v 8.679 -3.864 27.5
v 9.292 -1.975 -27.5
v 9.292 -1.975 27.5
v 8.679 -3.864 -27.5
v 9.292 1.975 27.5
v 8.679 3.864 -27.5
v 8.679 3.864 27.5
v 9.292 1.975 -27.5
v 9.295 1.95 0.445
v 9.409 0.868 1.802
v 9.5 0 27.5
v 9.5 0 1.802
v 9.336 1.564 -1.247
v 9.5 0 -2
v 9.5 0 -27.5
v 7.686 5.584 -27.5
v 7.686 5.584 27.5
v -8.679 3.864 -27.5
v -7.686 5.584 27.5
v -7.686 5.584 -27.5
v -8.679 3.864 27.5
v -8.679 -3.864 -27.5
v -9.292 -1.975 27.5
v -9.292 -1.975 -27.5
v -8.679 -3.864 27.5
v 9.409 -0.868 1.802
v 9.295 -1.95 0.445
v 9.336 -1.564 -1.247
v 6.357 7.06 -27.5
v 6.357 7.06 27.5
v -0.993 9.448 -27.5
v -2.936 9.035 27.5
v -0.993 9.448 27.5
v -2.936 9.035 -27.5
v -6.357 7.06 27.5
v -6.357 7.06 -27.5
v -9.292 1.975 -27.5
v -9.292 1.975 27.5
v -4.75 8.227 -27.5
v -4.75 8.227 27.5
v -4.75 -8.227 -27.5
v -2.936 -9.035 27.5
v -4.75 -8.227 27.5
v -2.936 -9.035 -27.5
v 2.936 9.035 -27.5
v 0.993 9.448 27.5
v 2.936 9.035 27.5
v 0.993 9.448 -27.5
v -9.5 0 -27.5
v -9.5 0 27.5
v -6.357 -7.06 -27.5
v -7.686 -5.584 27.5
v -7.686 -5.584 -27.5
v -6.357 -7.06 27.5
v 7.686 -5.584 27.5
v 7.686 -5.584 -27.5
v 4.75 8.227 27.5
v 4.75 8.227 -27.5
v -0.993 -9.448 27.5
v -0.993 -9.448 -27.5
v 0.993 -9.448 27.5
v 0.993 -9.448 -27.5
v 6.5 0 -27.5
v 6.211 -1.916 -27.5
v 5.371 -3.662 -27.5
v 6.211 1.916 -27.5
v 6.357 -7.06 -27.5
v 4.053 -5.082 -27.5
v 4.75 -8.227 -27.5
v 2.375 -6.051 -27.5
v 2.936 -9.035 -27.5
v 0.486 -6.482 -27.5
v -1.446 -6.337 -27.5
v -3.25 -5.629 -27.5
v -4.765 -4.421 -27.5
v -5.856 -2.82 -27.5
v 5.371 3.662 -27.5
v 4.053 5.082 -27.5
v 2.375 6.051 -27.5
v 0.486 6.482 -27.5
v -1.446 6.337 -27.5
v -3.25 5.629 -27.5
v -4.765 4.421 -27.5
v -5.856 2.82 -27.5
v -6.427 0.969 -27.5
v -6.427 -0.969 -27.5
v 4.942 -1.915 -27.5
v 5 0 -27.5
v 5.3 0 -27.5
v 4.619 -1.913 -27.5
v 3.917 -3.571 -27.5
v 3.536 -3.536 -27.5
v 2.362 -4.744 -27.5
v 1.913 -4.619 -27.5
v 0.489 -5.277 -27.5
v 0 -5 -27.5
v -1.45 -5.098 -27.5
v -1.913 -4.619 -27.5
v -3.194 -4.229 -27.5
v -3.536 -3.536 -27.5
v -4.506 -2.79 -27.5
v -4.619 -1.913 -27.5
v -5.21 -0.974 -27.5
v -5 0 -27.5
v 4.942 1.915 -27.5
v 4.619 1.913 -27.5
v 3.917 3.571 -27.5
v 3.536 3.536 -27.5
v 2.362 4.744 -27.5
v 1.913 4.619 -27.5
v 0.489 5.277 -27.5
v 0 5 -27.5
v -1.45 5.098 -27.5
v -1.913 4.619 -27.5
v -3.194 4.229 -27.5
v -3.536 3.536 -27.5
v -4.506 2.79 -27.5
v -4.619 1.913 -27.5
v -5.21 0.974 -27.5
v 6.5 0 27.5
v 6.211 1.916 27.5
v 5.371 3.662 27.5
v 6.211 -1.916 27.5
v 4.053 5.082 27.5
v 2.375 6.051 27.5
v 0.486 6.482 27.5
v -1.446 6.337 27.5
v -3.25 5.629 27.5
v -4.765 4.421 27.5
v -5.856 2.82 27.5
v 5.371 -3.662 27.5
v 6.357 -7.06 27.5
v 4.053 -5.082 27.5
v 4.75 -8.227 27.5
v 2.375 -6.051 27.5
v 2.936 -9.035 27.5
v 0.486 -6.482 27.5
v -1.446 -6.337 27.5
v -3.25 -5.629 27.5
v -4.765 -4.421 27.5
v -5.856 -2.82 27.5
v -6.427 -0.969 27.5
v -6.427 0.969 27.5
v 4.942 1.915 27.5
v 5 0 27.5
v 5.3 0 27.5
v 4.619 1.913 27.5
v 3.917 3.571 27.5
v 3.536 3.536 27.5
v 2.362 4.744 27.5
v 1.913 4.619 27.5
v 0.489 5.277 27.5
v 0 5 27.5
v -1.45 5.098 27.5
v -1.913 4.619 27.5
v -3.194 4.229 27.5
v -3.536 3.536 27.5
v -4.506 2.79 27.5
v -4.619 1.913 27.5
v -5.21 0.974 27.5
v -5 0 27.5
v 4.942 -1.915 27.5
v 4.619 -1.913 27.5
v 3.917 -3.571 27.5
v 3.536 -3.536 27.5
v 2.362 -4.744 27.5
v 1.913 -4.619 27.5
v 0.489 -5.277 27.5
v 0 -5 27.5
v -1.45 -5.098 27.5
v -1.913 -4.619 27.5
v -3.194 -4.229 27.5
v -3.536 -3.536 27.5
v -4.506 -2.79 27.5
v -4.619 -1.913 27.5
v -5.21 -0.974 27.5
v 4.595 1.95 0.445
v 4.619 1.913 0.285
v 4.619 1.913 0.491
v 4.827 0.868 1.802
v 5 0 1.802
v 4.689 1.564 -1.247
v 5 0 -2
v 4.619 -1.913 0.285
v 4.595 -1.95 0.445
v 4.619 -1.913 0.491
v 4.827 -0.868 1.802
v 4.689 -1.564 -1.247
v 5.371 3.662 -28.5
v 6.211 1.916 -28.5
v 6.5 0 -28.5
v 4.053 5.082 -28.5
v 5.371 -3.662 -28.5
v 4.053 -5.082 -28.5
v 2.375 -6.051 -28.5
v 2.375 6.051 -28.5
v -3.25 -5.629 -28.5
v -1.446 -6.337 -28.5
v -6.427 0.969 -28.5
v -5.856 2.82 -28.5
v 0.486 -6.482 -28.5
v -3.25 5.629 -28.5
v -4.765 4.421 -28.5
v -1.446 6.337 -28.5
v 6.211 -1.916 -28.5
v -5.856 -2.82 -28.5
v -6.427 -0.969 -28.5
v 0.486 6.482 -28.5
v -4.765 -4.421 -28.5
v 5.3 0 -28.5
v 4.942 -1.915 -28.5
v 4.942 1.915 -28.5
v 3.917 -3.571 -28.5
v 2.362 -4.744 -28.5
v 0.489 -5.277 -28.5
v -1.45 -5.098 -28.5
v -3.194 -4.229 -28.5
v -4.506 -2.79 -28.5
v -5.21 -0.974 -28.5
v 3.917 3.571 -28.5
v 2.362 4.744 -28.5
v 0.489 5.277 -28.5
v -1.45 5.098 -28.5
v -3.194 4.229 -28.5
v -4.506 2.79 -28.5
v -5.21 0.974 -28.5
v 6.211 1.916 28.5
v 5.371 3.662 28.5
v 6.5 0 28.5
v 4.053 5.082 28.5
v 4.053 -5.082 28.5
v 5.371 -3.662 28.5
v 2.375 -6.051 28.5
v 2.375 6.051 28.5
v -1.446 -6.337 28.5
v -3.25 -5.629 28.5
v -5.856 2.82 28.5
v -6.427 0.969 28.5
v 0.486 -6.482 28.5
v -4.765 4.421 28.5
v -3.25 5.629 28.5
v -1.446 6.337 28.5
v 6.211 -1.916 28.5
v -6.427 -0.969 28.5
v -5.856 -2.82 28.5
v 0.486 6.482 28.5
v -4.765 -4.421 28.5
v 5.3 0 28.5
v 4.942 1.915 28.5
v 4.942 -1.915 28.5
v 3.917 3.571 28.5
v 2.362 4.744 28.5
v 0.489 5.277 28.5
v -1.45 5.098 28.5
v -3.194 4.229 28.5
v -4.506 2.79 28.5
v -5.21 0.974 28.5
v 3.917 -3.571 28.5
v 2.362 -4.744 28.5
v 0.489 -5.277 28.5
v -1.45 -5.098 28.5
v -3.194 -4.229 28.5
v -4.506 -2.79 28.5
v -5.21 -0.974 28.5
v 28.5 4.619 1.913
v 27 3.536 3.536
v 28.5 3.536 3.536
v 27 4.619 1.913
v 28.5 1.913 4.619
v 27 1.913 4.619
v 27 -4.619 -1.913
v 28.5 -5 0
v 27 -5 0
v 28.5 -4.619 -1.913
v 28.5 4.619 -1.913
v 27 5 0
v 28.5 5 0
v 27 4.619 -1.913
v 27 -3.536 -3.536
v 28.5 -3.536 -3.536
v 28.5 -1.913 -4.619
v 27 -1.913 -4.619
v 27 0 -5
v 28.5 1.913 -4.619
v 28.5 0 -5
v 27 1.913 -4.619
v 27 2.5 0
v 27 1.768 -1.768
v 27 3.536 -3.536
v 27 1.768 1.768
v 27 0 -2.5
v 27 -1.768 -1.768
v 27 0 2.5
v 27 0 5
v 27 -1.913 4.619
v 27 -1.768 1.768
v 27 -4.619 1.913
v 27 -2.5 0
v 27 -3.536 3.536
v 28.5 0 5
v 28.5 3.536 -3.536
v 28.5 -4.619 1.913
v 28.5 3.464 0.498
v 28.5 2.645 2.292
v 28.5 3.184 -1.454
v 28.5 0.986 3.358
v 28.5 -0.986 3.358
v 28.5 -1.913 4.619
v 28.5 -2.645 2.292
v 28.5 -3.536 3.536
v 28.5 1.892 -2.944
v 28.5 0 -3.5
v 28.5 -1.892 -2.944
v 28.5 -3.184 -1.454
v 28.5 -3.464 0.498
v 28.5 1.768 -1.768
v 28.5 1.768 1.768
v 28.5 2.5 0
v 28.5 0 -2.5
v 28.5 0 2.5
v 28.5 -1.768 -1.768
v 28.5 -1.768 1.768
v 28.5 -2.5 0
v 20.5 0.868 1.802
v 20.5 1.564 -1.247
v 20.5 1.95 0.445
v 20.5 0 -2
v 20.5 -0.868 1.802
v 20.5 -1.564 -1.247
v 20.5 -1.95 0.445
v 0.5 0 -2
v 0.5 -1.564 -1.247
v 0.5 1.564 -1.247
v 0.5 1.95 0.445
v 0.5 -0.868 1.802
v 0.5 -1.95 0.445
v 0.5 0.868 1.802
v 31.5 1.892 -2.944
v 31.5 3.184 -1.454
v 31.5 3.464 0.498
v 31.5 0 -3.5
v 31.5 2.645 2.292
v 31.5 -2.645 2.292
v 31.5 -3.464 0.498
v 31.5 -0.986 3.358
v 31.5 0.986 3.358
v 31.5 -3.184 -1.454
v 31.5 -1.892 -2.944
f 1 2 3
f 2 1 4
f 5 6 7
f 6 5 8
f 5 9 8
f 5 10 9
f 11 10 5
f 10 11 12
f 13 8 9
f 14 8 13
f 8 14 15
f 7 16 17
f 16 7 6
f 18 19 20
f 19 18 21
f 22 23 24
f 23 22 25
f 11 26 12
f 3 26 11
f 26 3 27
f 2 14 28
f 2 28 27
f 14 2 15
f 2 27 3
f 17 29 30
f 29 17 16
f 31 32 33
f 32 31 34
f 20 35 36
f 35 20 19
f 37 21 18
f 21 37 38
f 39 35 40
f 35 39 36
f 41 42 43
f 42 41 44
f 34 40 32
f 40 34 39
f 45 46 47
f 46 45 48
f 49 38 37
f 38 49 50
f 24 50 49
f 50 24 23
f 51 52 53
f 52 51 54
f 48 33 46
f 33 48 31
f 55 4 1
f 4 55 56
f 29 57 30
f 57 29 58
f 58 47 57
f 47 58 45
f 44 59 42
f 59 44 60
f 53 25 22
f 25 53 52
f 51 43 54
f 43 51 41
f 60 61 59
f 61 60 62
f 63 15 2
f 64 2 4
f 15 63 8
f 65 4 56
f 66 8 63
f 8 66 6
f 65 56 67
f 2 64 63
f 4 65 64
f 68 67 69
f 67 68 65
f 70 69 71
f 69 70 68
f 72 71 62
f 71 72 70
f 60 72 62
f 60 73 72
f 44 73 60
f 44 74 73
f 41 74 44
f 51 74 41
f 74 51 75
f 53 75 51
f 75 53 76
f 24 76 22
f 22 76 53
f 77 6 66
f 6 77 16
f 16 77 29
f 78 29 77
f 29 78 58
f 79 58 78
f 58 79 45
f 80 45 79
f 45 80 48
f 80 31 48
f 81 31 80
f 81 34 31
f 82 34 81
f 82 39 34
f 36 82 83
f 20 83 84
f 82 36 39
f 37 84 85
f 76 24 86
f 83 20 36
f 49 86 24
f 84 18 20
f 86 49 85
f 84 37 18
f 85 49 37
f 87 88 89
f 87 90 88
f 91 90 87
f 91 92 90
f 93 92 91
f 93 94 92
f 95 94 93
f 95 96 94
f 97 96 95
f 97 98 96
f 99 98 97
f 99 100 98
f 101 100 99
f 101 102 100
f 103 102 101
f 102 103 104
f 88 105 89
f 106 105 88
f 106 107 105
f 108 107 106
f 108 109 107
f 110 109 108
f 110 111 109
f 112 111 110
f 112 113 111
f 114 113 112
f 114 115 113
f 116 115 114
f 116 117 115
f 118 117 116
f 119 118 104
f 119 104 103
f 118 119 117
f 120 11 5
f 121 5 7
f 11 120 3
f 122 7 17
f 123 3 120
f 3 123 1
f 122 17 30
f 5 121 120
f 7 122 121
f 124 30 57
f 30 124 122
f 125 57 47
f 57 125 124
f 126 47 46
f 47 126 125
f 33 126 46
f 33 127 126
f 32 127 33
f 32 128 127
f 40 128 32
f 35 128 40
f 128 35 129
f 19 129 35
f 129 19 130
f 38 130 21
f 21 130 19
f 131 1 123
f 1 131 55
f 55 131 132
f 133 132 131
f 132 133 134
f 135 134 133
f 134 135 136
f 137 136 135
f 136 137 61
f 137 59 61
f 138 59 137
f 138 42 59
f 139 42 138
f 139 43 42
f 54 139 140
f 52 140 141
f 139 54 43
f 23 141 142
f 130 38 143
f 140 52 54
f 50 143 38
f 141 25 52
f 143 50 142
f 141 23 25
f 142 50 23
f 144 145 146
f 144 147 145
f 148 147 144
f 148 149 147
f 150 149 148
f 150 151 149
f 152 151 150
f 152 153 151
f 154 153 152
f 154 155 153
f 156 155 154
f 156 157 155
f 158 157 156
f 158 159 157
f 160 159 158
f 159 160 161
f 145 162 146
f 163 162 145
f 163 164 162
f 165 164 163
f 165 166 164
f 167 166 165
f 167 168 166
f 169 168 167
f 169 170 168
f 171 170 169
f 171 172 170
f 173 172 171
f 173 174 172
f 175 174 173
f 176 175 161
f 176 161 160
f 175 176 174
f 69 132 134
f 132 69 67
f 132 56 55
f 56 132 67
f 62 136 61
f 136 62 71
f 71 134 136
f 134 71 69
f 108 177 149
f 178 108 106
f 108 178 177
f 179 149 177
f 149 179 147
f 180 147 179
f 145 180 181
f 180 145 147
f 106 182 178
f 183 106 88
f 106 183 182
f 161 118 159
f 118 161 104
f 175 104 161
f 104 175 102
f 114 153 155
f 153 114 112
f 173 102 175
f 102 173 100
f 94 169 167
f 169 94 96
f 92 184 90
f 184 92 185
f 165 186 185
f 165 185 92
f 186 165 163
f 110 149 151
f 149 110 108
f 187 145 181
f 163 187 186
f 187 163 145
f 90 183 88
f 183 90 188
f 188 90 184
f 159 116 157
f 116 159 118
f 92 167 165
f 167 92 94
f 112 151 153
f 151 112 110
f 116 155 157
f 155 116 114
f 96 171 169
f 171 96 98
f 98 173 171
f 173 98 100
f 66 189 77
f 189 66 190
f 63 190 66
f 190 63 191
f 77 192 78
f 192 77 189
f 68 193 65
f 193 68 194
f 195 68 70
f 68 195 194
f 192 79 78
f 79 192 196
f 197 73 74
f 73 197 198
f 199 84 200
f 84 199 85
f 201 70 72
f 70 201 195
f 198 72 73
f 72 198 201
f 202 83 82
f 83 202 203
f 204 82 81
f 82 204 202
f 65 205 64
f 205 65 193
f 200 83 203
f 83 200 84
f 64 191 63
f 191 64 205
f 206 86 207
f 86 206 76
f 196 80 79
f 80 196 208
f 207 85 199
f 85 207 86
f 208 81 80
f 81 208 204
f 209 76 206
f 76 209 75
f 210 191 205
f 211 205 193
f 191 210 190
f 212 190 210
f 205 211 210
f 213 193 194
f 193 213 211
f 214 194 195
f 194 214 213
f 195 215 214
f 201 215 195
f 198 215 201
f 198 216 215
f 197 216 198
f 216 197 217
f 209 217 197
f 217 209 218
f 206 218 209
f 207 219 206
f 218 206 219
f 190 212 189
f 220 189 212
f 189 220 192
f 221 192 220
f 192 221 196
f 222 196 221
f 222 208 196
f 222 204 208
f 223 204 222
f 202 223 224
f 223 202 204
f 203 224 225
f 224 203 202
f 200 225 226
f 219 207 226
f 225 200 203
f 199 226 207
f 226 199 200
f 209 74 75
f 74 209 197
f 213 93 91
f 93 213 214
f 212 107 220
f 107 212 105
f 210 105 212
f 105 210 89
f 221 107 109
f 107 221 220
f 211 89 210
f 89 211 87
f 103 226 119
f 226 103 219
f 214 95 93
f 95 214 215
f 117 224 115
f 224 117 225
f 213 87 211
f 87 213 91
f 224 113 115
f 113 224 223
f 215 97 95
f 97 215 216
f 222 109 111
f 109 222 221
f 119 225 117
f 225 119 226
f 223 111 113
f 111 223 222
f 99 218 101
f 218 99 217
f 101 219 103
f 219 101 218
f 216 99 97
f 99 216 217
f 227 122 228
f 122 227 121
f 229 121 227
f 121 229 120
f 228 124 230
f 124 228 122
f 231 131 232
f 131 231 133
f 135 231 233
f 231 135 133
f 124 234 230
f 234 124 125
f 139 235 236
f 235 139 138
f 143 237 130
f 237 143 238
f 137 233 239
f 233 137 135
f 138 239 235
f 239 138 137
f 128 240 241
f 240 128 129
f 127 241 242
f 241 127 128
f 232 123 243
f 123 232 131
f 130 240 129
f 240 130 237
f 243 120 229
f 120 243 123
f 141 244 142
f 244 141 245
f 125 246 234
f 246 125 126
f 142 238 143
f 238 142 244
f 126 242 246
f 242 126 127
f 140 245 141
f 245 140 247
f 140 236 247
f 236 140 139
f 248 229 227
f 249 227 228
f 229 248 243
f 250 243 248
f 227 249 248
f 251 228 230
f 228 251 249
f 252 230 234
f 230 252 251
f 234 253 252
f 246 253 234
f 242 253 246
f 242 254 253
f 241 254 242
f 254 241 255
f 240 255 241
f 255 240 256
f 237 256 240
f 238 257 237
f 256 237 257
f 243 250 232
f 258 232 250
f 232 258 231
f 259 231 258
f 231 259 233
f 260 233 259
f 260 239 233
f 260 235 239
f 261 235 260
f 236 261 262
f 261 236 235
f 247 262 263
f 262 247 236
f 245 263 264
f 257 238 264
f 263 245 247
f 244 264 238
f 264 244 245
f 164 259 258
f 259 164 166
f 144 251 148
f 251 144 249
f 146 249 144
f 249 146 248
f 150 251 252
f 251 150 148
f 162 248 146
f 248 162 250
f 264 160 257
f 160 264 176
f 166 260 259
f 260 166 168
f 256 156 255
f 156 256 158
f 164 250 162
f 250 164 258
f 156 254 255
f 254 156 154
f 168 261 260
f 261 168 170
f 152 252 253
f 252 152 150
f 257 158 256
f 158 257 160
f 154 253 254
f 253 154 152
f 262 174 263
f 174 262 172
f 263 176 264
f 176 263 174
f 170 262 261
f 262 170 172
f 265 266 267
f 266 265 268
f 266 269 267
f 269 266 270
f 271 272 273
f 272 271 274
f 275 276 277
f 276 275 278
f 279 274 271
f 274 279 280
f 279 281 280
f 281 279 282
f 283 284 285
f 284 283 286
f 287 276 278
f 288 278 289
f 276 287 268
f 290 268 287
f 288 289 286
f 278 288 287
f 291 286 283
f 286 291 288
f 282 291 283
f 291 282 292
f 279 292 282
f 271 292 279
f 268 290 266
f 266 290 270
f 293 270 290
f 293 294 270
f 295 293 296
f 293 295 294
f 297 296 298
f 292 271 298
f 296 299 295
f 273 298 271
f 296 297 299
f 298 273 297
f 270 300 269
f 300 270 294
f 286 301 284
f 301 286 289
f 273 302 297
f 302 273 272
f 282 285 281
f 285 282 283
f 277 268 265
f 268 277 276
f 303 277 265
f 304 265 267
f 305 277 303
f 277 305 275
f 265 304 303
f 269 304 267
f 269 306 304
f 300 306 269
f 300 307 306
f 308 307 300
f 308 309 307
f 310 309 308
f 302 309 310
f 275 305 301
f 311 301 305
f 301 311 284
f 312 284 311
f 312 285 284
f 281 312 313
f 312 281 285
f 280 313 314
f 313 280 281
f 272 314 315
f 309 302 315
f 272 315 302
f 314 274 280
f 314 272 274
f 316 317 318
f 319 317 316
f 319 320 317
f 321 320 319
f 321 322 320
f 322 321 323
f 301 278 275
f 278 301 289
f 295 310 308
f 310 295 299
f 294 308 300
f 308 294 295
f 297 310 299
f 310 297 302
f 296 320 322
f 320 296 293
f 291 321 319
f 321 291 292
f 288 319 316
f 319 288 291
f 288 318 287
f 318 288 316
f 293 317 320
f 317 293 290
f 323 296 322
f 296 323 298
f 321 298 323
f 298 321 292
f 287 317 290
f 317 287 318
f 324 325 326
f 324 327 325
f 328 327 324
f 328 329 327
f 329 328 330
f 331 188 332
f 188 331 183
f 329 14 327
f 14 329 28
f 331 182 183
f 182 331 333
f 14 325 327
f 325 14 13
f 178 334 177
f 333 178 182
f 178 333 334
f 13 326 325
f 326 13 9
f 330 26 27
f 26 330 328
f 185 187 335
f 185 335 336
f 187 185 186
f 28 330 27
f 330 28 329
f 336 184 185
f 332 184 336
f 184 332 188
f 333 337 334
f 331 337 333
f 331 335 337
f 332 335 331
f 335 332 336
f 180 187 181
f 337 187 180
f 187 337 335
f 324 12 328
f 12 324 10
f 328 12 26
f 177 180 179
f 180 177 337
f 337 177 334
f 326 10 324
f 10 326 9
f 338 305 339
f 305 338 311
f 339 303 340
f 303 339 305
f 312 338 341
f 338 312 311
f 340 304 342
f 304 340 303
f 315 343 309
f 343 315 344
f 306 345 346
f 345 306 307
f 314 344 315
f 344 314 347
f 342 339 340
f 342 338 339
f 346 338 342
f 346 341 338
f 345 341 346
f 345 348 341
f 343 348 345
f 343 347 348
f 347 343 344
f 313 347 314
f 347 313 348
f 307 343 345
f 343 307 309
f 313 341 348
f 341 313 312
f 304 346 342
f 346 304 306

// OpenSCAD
// Parameters
bore_diameter_mm = 10; //[5:20:0.1]
outer_diameter_mm = 19; //[10:38:0.1]
length_mm = 55; //[30:110:0.5]
overlap_mm = 1; //[0.5:2:0.1]
seal_lip_radial_thickness_mm = 1.2; //[0.6:2.4:0.1]
seal_lip_axial_length_mm = 2.5; //[1.5:5:0.1]
seal_lip_bore_clearance_mm = 0.3; //[0.1:0.8:0.05]
screw_shank_diameter_mm = 4; //[2:8:0.1]
screw_length_mm = 20; //[10:40:0.5]
screw_head_diameter_mm = 7; //[4:14:0.1]
screw_head_height_mm = 3; //[1.5:6:0.1]
washer_outer_diameter_mm = 10; //[6:20:0.1]
washer_thickness_mm = 1.5; //[0.8:3:0.1]

// Linear Bearing - complete geometry
module linear_bearing() {
  color("DimGray") {
    // Outer body
    difference() {
      cylinder(h=length_mm, r=outer_diameter_mm/2, center=true);
      // Through bore
      translate([0, 0, 0])
        cylinder(h=length_mm + 2*overlap_mm, r=bore_diameter_mm/2, center=true);
    }
    // End seal lips
    for (z = [-1, 1]) {
      translate([0, 0, z * (length_mm/2 - seal_lip_axial_length_mm/2 + overlap_mm)]) {
        difference() {
          cylinder(h=seal_lip_axial_length_mm, r=bore_diameter_mm/2 + seal_lip_bore_clearance_mm + seal_lip_radial_thickness_mm, center=true);
          cylinder(h=seal_lip_axial_length_mm + 2*overlap_mm, r=bore_diameter_mm/2 + seal_lip_bore_clearance_mm, center=true);
        }
      }
    }
  }
}

// Screw and Washer - complete geometry
module screw_and_washer() {
  color("Silver") {
    // Screw shank
    translate([outer_diameter_mm/2 + screw_shank_diameter_mm/2 - overlap_mm, 0, 0])
      rotate([0, 90, 0])
      cylinder(h=screw_length_mm, r=screw_shank_diameter_mm/2, center=true);
    // Screw head
    translate([outer_diameter_mm/2 + screw_length_mm + screw_head_height_mm/2 - overlap_mm, 0, 0])
      rotate([0, 90, 0])
      cylinder(h=screw_head_height_mm, r=screw_head_diameter_mm/2, center=true);
    // Washer
    difference() {
      translate([outer_diameter_mm/2 + screw_length_mm - washer_thickness_mm/2 - overlap_mm, 0, 0])
        rotate([0, 90, 0])
        cylinder(h=washer_thickness_mm, r=washer_outer_diameter_mm/2, center=true);
      translate([outer_diameter_mm/2 + screw_length_mm - washer_thickness_mm/2 - overlap_mm, 0, 0])
        rotate([0, 90, 0])
        cylinder(h=washer_thickness_mm + 2*overlap_mm, r=screw_shank_diameter_mm/2 + overlap_mm/2, center=true);
    }
  }
}

// Assembly
module assembly() {
  linear_bearing();
  screw_and_washer();
}

assembly();
